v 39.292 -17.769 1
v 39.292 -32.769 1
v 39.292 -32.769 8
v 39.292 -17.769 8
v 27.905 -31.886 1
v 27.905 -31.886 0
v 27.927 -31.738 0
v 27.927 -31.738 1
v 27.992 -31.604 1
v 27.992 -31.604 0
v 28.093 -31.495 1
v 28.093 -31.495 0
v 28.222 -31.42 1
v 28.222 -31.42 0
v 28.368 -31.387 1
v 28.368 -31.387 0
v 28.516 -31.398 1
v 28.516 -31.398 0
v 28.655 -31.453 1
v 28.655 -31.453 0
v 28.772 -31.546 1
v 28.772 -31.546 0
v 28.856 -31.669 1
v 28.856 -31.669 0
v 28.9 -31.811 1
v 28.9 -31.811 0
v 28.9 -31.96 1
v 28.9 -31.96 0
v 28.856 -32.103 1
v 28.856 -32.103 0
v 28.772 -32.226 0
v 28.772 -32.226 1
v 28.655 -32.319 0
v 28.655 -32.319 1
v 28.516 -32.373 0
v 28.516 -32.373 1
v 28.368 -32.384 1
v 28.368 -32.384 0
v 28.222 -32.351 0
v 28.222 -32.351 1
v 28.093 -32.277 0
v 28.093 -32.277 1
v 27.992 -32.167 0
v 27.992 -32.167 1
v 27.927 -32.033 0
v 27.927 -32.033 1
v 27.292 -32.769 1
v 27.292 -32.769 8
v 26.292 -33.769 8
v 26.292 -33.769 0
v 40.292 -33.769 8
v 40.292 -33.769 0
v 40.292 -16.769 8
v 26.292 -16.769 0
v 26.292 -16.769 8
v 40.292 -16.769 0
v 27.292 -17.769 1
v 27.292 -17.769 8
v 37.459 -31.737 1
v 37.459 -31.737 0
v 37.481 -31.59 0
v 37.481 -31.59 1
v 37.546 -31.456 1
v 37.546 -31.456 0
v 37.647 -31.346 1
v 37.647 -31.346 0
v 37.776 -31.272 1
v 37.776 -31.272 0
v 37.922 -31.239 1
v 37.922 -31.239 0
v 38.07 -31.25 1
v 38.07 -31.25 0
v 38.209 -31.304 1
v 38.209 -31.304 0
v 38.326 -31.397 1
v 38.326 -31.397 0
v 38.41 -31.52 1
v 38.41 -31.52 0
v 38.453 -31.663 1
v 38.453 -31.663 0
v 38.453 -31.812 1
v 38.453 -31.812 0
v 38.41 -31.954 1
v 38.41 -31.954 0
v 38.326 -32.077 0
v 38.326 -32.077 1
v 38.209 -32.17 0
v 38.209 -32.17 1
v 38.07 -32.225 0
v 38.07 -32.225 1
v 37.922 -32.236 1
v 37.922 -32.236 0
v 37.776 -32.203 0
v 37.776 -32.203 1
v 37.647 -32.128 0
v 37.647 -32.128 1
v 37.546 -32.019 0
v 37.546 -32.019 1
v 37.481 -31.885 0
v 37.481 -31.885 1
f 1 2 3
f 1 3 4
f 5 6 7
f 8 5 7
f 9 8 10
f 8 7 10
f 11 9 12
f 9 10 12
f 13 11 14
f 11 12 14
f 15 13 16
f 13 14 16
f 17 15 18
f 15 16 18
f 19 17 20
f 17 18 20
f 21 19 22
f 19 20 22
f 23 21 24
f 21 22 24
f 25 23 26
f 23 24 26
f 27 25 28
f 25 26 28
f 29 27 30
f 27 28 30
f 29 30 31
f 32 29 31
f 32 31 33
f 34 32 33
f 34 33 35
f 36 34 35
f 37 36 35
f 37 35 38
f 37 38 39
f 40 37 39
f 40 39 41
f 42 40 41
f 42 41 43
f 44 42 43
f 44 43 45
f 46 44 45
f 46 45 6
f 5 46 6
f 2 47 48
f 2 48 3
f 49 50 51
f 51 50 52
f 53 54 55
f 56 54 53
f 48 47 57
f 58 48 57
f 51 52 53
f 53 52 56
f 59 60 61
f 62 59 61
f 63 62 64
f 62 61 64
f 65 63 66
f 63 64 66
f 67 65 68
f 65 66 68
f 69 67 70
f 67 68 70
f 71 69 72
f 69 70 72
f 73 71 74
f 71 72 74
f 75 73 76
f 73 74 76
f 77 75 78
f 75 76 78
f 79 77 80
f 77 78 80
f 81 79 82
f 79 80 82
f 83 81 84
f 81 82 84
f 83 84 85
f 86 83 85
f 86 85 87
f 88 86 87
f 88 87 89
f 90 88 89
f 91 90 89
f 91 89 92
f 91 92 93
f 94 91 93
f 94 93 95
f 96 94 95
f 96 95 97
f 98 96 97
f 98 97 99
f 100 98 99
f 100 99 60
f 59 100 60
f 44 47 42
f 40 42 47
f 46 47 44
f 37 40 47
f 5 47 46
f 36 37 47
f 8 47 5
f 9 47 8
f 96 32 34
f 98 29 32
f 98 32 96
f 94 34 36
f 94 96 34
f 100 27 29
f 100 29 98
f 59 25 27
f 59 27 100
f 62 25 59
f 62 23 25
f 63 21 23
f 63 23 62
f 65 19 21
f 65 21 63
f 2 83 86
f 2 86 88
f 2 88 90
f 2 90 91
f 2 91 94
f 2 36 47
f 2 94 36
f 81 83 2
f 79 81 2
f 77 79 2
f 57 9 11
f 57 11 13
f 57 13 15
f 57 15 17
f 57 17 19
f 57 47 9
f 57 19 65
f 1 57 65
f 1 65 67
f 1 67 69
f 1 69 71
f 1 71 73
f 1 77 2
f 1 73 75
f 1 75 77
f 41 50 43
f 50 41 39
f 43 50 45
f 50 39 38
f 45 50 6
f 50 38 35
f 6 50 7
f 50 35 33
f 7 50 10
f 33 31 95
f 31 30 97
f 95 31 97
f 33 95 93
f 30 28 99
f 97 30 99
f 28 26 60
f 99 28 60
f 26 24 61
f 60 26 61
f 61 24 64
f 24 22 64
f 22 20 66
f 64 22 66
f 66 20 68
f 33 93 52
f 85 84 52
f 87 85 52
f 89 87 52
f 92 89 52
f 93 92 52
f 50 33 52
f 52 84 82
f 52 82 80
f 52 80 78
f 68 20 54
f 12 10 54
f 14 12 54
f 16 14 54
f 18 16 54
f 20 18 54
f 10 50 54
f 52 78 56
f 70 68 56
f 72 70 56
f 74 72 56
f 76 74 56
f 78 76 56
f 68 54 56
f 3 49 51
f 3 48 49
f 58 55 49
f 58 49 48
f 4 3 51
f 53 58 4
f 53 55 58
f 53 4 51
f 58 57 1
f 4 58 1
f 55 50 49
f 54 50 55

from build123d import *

# Parameters (mm, degrees)
F0_W     = 14
F0_H     = 17
F1_DEPTH = 1
F2_W     = 14
F2_H     = 17
F2_W_2   = 12
F2_H_2   = 15
F3_DEPTH = 7
F5_D     = 1


with BuildPart() as f1:
    # F0 (on Top) → F1 (new body)
    with BuildSketch(Plane.XY):
        with Locations((33.291668, -25.269144)):
            Rectangle(F0_W, F0_H)
    extrude(amount=F1_DEPTH)

    # F2 (on face) → F3 (join)
    with BuildSketch(Plane.XY.offset(1)):
        with Locations((33.291668, -25.269144)):
            Rectangle(F2_W, F2_H)
        with Locations((33.291668, -25.269144)):
            Rectangle(F2_W_2, F2_H_2, mode=Mode.SUBTRACT)
    extrude(amount=F3_DEPTH)

    # F5 (through all)
    with Locations(Plane.XY.offset(1)):
        with Locations((28.405087, -31.885728), (37.959054, -31.737298)):
            Hole(F5_D / 2)


solid = f1.part
